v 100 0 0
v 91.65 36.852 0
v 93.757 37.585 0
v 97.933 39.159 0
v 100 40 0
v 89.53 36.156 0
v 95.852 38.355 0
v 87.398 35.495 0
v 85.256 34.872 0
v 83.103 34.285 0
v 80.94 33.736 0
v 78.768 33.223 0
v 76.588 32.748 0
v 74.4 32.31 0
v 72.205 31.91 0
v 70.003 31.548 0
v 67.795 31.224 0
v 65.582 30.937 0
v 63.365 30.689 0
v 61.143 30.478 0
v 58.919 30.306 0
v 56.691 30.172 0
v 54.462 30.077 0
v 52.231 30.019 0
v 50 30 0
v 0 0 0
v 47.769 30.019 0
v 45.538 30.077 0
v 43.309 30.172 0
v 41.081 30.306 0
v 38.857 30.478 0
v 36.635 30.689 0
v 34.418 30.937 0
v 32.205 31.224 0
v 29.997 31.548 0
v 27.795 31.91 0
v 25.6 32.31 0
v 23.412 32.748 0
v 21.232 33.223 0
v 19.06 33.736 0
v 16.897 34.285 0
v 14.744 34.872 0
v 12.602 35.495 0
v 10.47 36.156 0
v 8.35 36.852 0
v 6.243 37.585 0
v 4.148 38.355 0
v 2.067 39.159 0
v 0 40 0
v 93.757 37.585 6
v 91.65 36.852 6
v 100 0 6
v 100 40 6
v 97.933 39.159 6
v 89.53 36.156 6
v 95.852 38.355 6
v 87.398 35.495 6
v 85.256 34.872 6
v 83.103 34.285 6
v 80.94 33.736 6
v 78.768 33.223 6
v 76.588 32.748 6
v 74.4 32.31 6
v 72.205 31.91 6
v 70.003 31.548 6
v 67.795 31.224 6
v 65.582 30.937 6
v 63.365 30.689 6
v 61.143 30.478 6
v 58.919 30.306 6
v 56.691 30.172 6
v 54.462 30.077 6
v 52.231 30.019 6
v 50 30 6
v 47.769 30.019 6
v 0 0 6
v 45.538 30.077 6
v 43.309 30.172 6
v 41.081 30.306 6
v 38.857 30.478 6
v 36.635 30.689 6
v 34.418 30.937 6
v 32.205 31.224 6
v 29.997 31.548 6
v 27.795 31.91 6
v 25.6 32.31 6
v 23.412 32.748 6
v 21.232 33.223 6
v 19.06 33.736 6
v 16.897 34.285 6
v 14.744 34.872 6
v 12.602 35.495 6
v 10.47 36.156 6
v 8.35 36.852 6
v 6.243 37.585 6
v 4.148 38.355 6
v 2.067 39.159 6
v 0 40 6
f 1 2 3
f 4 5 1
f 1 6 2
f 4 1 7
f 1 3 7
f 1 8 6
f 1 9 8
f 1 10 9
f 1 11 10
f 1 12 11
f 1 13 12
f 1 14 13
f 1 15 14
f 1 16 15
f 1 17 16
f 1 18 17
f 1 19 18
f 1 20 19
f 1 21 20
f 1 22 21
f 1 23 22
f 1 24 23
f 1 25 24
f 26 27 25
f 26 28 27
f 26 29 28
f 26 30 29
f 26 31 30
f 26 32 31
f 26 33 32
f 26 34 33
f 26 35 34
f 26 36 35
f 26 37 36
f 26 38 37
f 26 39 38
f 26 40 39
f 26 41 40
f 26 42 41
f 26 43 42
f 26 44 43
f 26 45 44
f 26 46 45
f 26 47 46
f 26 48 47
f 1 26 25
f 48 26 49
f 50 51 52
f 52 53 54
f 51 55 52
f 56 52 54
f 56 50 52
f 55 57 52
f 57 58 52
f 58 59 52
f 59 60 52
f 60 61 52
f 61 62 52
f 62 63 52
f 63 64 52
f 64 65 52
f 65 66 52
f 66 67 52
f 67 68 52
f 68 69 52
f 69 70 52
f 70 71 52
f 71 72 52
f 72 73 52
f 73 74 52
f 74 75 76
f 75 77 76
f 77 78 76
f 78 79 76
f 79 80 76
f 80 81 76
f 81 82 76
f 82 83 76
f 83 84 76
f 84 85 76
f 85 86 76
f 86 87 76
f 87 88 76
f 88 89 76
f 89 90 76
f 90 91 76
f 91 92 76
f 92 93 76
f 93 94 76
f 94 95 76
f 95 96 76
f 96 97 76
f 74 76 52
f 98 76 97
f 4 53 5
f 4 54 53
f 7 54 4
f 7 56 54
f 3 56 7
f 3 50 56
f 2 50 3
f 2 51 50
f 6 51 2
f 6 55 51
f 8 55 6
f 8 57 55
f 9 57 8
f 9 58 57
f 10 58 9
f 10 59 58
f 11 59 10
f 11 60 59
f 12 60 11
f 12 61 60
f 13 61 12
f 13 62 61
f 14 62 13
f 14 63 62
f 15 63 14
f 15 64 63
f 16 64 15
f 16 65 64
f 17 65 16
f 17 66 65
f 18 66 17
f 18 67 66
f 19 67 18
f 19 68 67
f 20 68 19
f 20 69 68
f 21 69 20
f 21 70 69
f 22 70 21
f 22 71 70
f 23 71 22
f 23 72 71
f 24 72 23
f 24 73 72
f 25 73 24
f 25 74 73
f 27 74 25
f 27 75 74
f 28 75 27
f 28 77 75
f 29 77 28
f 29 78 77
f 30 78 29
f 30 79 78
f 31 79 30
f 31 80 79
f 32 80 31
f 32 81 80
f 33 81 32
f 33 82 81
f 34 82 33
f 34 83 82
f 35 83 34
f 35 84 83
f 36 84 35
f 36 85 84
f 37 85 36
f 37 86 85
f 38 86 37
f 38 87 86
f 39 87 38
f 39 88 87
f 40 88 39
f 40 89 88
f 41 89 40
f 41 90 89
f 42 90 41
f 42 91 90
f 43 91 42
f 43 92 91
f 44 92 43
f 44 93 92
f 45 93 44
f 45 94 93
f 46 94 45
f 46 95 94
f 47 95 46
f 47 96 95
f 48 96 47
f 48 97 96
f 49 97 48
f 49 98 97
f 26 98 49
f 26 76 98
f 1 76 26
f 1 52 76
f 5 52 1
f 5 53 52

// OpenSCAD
$fn = 32;

// ----------------------------------------------------------------------
// Arc profile plate: notch, 49 points
// ----------------------------------------------------------------------

// --- parameters (mm) ---
bar_l = 100;              // bar length, X
bar_w = 40;               // bar width, Y
notch_depth = 10;         // depth of the arc notch at mid-span
arc_r = 130;              // radius of the notch arc
arc_angle = 45.24;        // notch arc angle, degrees
arc_step = 1;             // sampling step of the notch arc, degrees
plate_t = 6;              // plate thickness, Z
fit_tol = 0.1;            // declared fit tolerance (prompt contract)
free_tol = 0.5;           // declared free tolerance (prompt contract)

profile = [[0, 0], [100, 0], [100, 40], [97.933, 39.159], [95.852, 38.355], [93.757, 37.585], [91.65, 36.852], [89.53, 36.156], [87.398, 35.495], [85.256, 34.872], [83.103, 34.285], [80.94, 33.736], [78.768, 33.223], [76.588, 32.748], [74.4, 32.31], [72.205, 31.91], [70.003, 31.548], [67.795, 31.224], [65.582, 30.937], [63.365, 30.689], [61.143, 30.478], [58.919, 30.306], [56.691, 30.172], [54.462, 30.077], [52.231, 30.019], [50, 30], [47.769, 30.019], [45.538, 30.077], [43.309, 30.172], [41.081, 30.306], [38.857, 30.478], [36.635, 30.689], [34.418, 30.937], [32.205, 31.224], [29.997, 31.548], [27.795, 31.91], [25.6, 32.31], [23.412, 32.748], [21.232, 33.223], [19.06, 33.736], [16.897, 34.285], [14.744, 34.872], [12.602, 35.495], [10.47, 36.156], [8.35, 36.852], [6.243, 37.585], [4.148, 38.355], [2.067, 39.159], [0, 40]];  // primary outline, 49 points, counter clockwise

// --- the one profile operation ---
linear_extrude(height = plate_t) polygon(points = profile);
